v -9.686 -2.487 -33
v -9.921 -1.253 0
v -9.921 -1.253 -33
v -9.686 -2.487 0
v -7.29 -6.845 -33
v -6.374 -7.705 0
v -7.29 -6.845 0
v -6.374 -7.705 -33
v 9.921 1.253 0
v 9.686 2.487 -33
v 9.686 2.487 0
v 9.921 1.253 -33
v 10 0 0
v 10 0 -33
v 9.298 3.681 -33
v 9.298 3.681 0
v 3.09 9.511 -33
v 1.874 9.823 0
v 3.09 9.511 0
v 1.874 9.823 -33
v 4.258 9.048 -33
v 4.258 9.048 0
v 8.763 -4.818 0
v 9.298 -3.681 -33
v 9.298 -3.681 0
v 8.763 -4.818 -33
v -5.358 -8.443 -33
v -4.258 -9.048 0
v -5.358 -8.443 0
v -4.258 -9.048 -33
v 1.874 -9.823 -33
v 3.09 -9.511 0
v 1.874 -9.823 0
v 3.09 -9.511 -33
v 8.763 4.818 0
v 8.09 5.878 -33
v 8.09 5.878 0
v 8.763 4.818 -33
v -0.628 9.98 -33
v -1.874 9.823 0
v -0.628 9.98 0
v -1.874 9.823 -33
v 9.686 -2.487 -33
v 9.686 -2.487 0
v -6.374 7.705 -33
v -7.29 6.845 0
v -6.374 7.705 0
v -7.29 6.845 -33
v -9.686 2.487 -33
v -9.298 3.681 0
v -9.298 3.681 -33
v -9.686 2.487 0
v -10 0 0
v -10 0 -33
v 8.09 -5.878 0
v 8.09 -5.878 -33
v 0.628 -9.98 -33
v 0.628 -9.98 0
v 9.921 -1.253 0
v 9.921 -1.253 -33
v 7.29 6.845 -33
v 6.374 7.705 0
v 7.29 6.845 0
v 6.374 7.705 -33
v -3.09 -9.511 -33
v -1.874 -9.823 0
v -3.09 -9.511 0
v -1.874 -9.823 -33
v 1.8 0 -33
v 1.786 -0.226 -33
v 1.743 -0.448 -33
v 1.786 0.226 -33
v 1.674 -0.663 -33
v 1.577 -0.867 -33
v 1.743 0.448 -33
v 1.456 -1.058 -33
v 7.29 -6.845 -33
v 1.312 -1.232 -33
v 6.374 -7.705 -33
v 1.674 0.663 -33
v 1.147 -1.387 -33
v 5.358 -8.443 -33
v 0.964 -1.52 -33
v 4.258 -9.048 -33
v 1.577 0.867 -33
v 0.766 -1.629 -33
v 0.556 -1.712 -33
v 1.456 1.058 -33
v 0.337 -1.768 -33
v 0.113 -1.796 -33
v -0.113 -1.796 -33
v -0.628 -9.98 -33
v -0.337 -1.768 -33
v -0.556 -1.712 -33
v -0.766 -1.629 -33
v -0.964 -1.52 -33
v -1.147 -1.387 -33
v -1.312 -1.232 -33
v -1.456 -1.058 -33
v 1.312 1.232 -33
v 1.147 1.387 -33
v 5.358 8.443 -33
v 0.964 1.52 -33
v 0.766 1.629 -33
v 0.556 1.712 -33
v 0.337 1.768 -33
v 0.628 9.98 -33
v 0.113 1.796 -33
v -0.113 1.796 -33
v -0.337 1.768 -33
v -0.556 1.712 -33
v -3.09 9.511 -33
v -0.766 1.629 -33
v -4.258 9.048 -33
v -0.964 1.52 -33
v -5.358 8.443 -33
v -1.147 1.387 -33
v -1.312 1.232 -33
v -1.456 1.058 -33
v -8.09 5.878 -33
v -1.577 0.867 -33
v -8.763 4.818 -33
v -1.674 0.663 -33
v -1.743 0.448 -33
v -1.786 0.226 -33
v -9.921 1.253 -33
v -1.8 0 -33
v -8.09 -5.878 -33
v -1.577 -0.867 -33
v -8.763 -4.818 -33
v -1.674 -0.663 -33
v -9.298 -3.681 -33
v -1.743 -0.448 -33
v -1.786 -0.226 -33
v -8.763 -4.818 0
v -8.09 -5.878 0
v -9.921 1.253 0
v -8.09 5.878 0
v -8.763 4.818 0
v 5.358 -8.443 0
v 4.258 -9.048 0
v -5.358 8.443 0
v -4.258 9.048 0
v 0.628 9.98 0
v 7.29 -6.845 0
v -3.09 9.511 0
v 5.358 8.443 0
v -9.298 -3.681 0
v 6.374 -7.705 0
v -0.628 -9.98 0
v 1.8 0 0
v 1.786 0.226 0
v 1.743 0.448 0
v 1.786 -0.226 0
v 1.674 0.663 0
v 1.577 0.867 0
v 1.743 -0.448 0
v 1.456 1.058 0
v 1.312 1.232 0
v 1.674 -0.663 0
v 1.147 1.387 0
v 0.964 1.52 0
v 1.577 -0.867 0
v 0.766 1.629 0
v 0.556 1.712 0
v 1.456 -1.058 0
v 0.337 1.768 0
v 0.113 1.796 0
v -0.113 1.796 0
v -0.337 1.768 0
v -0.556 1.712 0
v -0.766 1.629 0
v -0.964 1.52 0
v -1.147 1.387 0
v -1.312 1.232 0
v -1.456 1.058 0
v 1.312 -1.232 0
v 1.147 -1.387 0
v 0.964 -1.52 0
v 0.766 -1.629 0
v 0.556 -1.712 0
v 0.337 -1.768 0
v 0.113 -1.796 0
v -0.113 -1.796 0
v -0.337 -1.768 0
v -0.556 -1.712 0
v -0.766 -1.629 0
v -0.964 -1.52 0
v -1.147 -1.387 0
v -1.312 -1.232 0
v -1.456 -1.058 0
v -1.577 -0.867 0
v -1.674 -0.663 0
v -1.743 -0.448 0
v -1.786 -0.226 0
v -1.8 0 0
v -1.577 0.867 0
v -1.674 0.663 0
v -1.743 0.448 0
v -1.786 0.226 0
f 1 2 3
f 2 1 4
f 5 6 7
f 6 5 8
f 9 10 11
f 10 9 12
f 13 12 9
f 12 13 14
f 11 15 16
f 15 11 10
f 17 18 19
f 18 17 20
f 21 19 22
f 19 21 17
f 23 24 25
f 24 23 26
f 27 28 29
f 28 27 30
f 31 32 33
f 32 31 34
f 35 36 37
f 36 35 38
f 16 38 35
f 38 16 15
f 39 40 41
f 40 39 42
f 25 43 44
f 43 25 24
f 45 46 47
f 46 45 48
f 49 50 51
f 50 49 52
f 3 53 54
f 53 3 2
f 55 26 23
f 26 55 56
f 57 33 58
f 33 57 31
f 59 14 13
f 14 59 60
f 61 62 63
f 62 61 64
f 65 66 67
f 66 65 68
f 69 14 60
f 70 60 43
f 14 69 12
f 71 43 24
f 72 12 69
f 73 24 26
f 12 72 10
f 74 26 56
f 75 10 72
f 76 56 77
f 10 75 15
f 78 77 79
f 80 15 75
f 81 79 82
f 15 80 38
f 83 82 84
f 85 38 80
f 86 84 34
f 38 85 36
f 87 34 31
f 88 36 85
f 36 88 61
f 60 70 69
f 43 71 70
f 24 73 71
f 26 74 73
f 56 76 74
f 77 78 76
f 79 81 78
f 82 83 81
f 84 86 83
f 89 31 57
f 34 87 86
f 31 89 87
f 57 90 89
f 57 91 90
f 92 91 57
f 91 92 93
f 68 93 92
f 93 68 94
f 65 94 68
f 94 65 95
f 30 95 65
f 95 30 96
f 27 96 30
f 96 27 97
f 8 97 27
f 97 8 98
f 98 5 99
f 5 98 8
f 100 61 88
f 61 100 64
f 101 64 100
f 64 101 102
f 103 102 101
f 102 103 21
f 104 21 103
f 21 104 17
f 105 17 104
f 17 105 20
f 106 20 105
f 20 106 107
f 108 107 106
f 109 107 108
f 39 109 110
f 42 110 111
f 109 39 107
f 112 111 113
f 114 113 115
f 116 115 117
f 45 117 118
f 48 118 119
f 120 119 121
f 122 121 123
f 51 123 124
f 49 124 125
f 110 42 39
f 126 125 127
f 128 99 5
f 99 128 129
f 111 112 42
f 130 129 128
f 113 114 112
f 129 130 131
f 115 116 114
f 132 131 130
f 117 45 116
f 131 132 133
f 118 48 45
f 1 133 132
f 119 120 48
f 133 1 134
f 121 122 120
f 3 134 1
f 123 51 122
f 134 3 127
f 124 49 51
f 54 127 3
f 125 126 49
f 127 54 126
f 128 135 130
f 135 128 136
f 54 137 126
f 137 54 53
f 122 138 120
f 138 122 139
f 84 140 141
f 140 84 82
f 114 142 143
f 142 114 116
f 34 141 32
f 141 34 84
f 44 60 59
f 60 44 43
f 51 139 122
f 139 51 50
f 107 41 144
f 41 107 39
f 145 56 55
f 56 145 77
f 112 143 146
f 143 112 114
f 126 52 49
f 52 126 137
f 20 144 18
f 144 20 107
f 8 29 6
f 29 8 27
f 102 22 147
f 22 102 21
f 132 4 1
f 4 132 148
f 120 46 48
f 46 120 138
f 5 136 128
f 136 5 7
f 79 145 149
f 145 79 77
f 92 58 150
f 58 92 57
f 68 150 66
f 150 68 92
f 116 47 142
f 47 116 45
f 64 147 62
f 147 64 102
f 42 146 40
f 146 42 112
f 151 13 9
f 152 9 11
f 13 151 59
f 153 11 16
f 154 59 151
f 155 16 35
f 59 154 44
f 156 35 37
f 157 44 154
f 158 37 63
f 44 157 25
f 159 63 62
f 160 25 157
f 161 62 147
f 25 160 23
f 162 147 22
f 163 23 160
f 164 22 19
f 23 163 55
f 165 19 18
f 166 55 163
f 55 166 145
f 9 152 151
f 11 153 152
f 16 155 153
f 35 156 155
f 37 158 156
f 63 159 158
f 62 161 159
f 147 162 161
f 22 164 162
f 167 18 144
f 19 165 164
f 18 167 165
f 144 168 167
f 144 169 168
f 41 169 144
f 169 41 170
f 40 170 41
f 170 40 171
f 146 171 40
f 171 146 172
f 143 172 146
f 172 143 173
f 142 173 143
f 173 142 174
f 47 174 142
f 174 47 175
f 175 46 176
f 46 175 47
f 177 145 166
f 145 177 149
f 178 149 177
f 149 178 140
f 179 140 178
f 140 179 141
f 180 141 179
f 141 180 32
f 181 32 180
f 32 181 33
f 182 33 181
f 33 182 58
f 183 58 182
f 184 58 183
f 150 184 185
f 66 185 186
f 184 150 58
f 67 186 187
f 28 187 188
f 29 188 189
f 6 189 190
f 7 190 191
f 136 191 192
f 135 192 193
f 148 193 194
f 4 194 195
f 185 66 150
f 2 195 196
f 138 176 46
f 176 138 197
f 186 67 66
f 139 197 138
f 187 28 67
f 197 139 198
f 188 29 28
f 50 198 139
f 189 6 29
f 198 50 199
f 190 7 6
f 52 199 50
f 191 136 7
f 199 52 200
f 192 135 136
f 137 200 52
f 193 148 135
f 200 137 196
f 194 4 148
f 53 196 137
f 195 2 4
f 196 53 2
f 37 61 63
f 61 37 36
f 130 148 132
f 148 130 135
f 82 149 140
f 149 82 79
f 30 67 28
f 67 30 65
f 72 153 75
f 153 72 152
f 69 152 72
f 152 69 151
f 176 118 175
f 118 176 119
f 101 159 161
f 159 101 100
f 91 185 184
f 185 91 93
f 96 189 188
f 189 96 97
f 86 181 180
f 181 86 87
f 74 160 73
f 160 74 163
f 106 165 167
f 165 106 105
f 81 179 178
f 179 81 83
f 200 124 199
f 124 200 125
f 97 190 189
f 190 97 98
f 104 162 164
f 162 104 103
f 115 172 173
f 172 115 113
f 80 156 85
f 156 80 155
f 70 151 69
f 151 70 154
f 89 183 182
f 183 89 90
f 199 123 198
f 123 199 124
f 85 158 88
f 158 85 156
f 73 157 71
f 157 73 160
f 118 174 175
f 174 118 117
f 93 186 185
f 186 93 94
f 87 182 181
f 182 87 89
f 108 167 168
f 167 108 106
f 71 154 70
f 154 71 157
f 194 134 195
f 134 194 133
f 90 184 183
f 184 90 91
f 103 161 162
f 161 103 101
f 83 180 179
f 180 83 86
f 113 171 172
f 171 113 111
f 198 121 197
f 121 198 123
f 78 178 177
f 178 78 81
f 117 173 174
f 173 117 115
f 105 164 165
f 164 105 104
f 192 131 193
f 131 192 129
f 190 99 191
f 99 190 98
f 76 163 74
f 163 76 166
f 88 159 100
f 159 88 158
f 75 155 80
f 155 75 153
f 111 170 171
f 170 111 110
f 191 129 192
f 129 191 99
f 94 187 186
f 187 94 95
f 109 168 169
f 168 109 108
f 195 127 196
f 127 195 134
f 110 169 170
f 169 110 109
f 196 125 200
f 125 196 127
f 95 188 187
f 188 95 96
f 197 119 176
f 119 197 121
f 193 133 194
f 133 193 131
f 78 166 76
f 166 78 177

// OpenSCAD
$fn = 50;


difference() {
	union() {
		translate(v = [0, 0, -33.0000000000]) {
			cylinder(h = 33, r = 10.0000000000);
		}
		cylinder(h = 0, r = 13.0000000000);
	}
	union() {
		#translate(v = [0, 0, -33]) {
			cylinder(h = 33, r = 1.8000000000);
		}
	}
}
